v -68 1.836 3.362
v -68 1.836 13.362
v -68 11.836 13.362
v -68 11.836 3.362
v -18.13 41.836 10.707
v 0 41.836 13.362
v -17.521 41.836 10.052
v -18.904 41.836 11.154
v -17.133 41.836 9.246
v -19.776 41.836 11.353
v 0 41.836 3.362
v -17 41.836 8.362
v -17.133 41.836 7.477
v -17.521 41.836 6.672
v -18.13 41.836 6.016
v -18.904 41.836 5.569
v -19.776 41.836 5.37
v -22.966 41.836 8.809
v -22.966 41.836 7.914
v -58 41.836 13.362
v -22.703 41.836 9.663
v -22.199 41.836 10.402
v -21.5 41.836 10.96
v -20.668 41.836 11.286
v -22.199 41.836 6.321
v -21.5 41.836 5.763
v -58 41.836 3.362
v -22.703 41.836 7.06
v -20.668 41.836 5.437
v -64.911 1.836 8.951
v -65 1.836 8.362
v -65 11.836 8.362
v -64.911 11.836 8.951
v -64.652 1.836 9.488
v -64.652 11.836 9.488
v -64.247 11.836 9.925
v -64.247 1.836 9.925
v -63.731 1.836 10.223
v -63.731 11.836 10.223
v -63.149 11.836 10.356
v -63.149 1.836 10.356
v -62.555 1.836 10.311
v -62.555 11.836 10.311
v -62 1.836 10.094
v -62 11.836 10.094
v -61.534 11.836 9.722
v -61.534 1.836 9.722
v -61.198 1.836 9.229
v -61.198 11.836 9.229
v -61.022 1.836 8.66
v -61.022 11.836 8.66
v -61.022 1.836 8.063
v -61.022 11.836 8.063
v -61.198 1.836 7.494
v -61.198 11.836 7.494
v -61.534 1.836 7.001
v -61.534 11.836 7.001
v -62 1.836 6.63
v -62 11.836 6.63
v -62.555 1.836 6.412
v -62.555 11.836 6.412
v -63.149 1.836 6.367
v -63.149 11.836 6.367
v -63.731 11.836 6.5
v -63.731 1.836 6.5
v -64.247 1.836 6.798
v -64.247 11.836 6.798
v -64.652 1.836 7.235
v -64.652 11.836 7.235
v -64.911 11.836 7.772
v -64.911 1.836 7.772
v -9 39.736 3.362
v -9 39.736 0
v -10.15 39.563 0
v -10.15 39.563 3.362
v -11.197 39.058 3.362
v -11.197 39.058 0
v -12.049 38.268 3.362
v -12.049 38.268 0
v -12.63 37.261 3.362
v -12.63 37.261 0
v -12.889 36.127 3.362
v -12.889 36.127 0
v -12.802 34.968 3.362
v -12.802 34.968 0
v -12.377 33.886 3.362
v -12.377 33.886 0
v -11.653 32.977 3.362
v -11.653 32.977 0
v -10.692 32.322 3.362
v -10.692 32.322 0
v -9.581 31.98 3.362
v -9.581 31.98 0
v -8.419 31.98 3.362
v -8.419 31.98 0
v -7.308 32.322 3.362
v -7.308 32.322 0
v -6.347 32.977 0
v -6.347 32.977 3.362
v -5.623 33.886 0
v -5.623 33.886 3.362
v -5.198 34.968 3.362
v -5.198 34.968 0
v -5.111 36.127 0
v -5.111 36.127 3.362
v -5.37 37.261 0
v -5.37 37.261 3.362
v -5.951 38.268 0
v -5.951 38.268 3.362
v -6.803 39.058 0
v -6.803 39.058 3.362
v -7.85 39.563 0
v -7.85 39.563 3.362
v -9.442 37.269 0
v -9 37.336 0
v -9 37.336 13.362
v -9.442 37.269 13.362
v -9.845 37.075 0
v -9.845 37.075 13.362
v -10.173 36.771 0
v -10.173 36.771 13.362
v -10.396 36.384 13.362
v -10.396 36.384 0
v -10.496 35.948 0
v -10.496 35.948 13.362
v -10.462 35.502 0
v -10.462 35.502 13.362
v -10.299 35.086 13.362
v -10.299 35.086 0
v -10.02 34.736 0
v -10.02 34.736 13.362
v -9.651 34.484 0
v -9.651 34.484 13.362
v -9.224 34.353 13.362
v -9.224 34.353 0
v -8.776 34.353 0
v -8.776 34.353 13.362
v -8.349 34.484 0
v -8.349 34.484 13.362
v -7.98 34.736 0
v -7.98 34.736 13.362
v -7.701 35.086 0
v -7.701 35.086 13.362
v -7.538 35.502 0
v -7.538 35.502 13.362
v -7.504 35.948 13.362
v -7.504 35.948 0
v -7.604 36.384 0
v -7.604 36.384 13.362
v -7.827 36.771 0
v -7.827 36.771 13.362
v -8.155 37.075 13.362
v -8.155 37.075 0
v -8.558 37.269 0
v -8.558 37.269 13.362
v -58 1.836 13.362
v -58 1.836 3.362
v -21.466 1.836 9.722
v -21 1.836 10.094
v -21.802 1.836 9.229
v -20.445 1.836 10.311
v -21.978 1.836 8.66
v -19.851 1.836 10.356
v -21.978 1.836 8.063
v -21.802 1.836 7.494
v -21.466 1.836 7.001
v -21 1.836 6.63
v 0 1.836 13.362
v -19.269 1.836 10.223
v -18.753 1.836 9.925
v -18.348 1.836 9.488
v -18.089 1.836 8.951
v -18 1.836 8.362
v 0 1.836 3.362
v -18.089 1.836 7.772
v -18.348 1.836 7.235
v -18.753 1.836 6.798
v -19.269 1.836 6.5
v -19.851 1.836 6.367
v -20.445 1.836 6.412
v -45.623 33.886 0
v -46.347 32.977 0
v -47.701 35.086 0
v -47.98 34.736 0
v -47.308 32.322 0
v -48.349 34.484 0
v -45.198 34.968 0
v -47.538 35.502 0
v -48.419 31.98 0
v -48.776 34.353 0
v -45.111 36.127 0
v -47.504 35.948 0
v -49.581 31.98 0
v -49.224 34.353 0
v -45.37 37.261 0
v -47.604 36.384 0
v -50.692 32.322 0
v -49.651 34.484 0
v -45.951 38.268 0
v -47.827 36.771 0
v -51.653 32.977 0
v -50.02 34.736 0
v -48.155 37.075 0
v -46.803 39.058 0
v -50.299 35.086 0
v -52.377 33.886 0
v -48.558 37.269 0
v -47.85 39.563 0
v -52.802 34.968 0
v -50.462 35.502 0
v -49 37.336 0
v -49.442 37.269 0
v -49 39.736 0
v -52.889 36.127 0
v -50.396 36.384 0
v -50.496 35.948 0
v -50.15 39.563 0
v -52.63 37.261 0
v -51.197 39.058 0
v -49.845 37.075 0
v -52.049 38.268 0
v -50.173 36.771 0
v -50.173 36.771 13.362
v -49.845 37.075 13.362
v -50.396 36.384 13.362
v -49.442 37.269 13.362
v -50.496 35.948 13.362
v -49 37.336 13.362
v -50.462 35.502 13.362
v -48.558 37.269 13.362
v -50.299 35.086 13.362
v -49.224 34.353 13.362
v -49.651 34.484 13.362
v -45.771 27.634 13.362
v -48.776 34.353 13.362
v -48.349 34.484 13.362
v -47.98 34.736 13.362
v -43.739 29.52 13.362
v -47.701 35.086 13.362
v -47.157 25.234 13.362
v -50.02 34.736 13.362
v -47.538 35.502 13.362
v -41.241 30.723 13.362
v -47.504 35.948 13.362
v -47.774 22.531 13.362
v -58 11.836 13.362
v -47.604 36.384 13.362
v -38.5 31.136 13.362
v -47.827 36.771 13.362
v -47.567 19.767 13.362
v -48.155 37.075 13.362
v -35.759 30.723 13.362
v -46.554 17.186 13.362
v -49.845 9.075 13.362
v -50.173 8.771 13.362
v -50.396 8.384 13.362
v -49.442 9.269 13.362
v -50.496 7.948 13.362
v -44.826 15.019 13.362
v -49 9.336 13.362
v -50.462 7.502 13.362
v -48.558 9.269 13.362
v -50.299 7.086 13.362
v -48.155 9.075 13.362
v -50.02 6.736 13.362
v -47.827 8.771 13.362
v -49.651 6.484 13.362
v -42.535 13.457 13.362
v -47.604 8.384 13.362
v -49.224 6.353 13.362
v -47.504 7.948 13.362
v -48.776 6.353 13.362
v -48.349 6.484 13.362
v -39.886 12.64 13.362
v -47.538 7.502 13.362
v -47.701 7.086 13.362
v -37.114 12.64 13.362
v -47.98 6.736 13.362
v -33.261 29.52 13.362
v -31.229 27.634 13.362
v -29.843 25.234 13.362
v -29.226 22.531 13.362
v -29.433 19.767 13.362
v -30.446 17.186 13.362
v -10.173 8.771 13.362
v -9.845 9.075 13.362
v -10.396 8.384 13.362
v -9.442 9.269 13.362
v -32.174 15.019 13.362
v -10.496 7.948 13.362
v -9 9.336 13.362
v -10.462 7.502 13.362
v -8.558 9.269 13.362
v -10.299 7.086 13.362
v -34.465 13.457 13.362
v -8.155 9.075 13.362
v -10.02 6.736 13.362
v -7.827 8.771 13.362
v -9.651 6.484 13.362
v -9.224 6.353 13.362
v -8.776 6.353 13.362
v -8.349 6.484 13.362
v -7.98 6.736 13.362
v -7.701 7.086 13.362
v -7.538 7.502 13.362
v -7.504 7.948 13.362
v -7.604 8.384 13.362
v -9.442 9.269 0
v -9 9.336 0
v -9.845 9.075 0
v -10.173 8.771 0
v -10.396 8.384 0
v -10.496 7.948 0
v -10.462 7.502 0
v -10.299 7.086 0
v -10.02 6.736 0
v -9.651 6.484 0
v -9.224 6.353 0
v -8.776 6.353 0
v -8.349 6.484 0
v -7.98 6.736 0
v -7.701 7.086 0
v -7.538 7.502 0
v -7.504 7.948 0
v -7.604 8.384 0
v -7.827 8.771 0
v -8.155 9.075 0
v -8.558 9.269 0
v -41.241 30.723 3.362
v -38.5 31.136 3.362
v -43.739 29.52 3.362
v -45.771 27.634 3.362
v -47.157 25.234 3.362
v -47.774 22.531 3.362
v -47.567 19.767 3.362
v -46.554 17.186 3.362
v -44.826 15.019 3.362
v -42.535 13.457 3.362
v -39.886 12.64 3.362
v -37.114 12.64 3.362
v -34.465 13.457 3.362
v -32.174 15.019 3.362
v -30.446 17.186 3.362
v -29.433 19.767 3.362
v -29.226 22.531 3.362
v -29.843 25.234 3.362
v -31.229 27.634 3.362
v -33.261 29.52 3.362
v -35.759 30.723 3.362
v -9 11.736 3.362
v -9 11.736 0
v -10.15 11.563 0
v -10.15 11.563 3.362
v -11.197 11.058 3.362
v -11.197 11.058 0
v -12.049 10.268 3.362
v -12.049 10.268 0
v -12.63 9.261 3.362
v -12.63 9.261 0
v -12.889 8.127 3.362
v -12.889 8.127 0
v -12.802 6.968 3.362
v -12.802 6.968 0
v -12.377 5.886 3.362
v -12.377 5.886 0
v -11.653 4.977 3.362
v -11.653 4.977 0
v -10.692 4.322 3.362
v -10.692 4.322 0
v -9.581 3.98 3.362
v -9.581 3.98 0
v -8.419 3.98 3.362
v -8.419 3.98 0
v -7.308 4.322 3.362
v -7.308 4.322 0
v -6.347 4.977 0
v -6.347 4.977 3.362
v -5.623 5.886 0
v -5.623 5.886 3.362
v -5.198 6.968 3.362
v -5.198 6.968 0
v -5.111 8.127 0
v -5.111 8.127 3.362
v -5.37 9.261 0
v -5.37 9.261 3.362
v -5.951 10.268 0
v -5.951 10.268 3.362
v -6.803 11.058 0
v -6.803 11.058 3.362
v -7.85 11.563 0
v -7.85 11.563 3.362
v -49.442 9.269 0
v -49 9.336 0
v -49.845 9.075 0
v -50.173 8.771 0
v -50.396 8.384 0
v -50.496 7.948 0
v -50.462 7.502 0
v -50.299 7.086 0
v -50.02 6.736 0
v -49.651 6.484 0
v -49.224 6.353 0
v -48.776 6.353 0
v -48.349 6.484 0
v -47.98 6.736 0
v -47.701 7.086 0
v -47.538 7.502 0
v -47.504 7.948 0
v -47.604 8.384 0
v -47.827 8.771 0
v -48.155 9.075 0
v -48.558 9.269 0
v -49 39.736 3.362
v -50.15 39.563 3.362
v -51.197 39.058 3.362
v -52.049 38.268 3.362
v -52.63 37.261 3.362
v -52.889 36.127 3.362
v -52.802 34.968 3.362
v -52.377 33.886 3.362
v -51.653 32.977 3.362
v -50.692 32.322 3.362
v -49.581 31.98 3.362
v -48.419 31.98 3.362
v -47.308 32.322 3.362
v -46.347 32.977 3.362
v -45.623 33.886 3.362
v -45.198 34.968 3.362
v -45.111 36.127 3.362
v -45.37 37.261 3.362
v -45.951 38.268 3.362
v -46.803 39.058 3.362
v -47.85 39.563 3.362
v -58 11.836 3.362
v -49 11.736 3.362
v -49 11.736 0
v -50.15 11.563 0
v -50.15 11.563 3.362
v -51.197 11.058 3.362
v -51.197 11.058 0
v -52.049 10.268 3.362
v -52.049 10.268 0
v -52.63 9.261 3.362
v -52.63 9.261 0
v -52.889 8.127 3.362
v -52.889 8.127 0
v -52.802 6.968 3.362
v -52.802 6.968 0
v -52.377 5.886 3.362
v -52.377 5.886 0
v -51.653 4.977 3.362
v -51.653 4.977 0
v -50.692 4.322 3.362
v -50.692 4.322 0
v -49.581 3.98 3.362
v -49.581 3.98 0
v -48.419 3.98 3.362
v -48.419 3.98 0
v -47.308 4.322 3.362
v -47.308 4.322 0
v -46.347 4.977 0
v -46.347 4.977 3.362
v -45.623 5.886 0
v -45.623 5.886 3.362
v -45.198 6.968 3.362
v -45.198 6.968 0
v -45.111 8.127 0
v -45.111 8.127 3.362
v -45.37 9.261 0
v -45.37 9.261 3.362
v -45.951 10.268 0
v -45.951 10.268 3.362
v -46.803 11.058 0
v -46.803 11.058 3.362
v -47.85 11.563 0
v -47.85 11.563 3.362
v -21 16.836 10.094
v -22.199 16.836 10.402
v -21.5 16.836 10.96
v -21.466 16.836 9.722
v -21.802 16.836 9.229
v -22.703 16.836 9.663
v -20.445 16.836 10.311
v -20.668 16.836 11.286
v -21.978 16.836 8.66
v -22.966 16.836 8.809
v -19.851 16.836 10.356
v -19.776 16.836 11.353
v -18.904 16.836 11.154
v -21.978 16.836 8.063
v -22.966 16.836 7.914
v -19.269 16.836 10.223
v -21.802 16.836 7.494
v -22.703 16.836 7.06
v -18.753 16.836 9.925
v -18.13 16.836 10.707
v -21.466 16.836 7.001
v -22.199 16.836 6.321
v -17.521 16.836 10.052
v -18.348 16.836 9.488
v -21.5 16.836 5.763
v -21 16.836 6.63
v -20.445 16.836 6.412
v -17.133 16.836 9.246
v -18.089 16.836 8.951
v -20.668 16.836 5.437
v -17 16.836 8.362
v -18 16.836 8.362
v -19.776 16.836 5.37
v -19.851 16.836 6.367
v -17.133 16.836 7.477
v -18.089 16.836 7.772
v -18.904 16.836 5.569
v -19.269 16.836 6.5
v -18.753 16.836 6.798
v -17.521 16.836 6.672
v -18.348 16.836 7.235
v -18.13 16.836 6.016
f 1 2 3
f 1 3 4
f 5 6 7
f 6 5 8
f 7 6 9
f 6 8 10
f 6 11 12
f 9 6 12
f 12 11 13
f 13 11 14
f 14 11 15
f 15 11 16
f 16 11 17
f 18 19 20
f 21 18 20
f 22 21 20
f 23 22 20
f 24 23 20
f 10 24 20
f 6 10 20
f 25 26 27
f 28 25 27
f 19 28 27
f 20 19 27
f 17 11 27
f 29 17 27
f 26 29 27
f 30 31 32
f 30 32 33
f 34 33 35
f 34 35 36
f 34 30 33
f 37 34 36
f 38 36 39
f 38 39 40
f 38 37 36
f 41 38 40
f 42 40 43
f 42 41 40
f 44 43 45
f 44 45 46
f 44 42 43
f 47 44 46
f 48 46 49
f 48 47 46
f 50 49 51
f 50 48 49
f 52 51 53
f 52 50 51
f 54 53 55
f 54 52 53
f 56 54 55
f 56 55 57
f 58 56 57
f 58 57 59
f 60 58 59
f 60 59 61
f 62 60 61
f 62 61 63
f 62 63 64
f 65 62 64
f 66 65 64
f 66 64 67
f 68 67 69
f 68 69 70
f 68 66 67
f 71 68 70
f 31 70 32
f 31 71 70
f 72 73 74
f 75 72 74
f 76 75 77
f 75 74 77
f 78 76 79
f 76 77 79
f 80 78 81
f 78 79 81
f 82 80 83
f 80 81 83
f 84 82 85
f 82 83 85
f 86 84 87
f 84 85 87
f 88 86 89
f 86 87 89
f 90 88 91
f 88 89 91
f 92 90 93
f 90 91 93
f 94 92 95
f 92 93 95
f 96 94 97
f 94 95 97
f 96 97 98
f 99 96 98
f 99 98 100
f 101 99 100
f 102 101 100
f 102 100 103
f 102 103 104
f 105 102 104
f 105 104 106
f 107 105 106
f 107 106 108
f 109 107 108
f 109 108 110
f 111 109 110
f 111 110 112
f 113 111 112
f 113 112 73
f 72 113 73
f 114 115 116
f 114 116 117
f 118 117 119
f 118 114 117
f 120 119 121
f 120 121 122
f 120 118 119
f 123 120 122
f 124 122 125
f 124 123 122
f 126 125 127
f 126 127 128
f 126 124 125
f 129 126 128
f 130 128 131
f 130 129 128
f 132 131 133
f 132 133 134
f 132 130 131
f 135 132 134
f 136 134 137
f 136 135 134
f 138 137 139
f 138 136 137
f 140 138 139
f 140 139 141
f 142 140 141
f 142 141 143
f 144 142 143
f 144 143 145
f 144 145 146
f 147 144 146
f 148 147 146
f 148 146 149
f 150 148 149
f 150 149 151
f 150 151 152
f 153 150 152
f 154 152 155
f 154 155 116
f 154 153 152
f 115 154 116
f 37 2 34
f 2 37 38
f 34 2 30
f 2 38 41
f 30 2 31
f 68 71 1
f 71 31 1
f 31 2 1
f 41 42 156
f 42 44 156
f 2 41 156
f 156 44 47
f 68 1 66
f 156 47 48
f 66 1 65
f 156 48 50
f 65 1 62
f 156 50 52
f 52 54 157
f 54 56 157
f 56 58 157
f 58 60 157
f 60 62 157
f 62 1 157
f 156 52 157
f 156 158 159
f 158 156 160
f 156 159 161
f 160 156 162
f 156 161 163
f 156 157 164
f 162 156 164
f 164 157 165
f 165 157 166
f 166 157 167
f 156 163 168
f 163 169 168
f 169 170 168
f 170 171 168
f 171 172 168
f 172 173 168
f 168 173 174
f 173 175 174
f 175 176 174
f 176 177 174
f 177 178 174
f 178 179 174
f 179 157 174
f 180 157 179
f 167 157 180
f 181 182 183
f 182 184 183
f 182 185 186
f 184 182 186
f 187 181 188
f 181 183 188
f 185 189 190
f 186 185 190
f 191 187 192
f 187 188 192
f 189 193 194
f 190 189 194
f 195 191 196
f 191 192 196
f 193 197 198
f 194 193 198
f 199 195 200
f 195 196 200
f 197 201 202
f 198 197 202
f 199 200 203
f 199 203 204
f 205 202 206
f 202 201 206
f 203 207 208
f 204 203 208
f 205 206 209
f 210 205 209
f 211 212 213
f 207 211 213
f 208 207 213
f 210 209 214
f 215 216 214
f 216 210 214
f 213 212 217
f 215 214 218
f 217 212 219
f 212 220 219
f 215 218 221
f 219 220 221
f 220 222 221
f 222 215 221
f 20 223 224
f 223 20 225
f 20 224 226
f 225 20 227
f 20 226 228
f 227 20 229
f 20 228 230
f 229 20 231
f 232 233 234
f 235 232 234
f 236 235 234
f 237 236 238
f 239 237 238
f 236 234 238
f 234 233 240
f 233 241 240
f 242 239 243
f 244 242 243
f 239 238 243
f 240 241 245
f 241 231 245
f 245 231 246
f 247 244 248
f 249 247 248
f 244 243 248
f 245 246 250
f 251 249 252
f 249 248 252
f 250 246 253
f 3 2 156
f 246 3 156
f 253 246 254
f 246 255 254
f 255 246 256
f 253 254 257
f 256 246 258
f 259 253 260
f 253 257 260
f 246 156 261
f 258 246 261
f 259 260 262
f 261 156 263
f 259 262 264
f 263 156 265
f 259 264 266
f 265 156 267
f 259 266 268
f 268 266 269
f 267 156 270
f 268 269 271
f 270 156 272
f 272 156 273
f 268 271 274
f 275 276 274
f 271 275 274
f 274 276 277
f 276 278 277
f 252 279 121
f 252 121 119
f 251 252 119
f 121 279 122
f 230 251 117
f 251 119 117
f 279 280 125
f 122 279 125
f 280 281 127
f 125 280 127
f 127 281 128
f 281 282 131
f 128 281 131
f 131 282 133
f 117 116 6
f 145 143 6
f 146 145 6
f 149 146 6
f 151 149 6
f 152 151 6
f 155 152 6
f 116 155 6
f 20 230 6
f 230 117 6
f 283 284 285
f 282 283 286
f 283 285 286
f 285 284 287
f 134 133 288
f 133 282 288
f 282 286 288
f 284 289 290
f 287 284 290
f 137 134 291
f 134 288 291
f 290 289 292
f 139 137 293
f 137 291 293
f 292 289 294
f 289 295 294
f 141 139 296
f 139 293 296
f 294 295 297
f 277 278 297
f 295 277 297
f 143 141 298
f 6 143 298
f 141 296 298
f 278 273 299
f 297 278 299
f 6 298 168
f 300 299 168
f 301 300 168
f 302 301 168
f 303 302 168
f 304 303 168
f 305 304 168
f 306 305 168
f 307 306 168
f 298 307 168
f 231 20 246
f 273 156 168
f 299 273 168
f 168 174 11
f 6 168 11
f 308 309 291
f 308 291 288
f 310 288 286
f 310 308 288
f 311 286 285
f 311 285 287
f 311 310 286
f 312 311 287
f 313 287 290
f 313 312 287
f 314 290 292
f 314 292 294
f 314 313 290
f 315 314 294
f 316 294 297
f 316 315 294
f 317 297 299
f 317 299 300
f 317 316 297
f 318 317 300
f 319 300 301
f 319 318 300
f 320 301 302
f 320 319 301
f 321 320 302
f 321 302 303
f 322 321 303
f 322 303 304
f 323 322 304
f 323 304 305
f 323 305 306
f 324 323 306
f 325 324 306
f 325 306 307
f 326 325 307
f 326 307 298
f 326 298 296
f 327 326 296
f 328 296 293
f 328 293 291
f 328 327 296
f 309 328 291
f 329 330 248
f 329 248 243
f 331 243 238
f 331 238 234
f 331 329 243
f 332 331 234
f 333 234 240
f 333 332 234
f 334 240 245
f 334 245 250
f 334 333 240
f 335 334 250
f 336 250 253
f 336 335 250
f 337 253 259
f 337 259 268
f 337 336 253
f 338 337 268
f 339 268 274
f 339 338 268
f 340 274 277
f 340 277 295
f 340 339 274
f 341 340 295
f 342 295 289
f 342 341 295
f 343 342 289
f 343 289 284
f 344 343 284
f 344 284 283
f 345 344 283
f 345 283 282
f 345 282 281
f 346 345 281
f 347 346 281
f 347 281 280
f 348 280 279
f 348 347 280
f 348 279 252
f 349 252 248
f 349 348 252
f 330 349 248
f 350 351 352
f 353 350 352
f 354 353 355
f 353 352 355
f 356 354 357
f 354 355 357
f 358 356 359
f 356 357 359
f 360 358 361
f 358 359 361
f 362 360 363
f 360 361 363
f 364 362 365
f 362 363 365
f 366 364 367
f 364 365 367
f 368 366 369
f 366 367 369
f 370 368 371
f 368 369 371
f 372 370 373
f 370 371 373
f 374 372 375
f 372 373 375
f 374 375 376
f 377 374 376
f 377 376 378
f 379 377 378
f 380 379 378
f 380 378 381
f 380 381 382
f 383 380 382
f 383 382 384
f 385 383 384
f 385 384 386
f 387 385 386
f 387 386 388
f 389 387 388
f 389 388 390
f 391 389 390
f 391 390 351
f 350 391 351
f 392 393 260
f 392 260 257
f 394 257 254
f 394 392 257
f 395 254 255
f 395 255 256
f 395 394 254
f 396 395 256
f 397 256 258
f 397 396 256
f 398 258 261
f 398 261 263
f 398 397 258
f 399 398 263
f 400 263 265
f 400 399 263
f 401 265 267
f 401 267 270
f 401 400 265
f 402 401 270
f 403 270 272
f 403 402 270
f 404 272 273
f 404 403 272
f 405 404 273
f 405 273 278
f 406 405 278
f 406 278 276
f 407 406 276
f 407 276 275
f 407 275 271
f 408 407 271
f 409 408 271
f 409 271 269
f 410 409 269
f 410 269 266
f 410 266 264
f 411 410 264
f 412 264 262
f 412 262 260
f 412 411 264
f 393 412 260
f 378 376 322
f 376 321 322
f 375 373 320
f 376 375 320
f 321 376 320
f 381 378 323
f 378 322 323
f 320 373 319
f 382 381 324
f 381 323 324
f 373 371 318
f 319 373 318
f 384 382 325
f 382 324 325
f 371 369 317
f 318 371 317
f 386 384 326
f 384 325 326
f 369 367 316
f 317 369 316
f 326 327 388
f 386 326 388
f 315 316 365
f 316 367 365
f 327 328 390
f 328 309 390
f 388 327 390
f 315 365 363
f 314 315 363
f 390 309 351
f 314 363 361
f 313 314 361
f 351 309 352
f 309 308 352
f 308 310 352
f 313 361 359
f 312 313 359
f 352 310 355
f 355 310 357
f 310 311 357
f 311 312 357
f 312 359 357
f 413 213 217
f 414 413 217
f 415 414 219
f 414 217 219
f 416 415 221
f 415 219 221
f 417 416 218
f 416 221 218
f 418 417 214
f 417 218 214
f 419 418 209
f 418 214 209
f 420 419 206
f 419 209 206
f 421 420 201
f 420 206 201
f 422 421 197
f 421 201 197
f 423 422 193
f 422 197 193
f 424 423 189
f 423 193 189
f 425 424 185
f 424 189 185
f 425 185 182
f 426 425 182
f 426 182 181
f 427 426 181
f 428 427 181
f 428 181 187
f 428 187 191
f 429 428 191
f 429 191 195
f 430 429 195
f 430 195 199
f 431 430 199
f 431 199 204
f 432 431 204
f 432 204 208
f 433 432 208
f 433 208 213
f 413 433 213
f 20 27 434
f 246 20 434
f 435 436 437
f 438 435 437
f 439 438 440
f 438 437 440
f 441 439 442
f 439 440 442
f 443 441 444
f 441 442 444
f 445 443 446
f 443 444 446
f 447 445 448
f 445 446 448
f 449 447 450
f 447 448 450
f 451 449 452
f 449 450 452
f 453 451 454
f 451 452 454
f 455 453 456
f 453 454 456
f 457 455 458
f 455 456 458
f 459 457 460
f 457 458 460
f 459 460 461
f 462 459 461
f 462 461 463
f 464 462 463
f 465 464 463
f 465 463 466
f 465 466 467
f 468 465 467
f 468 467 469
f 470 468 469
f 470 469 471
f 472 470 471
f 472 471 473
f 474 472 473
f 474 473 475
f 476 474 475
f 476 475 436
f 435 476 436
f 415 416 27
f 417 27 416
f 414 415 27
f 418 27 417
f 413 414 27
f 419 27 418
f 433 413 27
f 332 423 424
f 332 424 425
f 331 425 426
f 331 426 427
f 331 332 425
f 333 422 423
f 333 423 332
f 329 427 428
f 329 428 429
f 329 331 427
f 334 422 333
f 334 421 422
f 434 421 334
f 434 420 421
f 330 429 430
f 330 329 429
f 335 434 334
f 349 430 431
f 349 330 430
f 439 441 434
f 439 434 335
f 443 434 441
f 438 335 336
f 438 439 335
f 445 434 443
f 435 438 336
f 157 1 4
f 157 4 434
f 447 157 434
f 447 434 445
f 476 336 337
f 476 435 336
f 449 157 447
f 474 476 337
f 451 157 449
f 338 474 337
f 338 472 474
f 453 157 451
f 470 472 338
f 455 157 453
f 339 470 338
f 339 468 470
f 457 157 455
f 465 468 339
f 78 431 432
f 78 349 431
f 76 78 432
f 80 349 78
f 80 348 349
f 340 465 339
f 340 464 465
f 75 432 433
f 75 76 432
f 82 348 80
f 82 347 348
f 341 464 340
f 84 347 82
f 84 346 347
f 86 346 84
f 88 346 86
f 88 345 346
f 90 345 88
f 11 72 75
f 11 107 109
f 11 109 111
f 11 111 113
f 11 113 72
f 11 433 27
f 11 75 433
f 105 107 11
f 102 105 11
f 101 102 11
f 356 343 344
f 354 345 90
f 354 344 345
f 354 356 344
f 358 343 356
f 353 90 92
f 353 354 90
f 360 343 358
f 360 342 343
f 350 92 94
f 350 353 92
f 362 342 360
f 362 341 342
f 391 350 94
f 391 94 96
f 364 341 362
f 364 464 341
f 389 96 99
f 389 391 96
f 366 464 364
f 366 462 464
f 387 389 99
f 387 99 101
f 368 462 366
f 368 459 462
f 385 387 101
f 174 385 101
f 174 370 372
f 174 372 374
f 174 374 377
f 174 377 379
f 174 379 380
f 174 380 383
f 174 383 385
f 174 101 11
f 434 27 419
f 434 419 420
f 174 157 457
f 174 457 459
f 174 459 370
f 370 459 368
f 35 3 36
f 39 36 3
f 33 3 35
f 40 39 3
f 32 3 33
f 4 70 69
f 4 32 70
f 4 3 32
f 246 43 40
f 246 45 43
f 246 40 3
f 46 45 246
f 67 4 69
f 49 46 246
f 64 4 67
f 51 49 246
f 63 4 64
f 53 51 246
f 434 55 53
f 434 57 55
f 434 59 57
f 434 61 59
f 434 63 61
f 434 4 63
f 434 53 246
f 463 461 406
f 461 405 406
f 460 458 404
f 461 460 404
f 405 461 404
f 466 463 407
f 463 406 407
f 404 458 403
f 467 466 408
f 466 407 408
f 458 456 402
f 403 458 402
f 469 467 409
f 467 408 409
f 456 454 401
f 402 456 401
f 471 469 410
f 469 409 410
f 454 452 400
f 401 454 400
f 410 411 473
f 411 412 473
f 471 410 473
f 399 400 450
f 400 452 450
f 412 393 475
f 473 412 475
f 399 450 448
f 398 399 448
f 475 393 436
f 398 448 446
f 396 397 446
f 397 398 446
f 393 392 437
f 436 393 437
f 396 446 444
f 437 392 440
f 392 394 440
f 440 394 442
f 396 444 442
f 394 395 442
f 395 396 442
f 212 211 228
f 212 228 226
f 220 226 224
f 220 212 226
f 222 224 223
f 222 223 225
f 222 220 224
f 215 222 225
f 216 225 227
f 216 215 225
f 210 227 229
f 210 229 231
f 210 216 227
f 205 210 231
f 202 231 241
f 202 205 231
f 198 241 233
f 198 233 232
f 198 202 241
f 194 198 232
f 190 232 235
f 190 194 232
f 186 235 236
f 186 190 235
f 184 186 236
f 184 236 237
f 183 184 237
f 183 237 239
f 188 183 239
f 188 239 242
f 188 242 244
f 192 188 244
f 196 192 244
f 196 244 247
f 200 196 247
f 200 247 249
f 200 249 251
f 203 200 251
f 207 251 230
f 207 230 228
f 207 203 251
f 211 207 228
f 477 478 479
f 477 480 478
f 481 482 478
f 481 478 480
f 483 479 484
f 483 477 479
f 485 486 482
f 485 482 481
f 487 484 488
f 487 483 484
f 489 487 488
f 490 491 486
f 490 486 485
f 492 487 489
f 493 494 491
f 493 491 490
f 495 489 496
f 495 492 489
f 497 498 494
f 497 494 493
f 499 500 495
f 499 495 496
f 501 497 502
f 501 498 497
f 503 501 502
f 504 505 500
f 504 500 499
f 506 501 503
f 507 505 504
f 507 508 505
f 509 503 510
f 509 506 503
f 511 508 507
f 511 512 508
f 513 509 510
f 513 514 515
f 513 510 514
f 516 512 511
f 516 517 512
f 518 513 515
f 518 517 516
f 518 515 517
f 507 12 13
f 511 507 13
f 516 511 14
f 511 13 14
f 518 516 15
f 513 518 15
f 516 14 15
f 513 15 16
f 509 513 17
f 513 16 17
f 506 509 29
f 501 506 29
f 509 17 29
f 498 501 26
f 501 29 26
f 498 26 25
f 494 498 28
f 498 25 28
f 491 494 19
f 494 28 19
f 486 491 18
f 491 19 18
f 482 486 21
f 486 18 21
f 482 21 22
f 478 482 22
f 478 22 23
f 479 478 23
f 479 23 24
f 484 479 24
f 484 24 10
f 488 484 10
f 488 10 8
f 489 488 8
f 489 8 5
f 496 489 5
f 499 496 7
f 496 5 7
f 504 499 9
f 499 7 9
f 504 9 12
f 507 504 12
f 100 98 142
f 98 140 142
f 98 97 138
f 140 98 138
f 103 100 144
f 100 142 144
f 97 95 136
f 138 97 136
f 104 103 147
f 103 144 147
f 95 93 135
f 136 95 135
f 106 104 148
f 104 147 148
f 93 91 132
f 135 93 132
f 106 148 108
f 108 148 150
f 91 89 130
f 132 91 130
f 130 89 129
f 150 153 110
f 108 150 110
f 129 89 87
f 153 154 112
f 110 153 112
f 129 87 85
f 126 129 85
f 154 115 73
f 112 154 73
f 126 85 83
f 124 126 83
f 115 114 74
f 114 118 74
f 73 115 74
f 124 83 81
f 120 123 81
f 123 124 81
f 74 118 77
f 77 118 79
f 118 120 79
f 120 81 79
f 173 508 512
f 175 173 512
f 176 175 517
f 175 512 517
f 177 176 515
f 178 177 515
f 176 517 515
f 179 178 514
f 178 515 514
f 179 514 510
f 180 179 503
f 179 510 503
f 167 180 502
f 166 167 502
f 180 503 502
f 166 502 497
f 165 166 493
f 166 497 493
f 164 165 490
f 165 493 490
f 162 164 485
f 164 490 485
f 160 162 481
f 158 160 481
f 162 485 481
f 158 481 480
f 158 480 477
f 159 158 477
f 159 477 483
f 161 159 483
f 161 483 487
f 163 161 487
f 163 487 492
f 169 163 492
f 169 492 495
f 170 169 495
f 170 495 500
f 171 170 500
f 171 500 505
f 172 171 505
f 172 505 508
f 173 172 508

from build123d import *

# Parameters (mm, degrees)
SKETCH1_R             = 3.9
SKETCH1_R_2           = 1.5
BOSS_EXTRUDE1_DEPTH   = 13.361552014
BOSS_EXTRUDE1_2_DEPTH = 13.361552014
BOSS_EXTRUDE1_3_DEPTH = 13.361552014
BOSS_EXTRUDE1_4_DEPTH = 13.361552014
BOSS_EXTRUDE2_START   = 5.161552
SKETCH2_R             = 3.9
SKETCH2_R_2           = 9.3
BOSS_EXTRUDE2_DEPTH   = 10
CUT_EXTRUDE1_DEPTH    = 25
CUT_EXTRUDE2_DEPTH    = 72.711443105
SKETCH5_W             = 10
SKETCH5_H             = 10
SKETCH5_R             = 2
BOSS_EXTRUDE3_DEPTH   = 10


with BuildPart() as part:
    # Sketch1 → Boss-Extrude1 (new body)
    with BuildSketch(Plane.XY):
        with Locations(Location((-49, 7.83595021, 0), (0, 0, 90))):
            Circle(SKETCH1_R)
        with Locations(Location((-49, 7.83595021, 0), (0, 0, 90))):
            Circle(SKETCH1_R_2, mode=Mode.SUBTRACT)
    extrude(amount=BOSS_EXTRUDE1_DEPTH)



with BuildPart() as body_2:
    # Sketch1 → Boss-Extrude1 2 (new body)
    with BuildSketch(Plane.XY):
        with Locations(Location((-49, 35.83595021, 0), (0, 0, 90))):
            Circle(SKETCH1_R)
        with Locations(Location((-49, 35.83595021, 0), (0, 0, 90))):
            Circle(SKETCH1_R_2, mode=Mode.SUBTRACT)
    extrude(amount=BOSS_EXTRUDE1_2_DEPTH)


with BuildPart() as body_3:
    # Sketch1 → Boss-Extrude1 3 (new body)
    with BuildSketch(Plane.XY):
        with Locations(Location((-9, 35.83595021, 0), (0, 0, 90))):
            Circle(SKETCH1_R)
        with Locations(Location((-9, 35.83595021, 0), (0, 0, 90))):
            Circle(SKETCH1_R_2, mode=Mode.SUBTRACT)
    extrude(amount=BOSS_EXTRUDE1_3_DEPTH)


with BuildPart() as body_4:
    # Sketch1 → Boss-Extrude1 4 (new body)
    with BuildSketch(Plane.XY):
        with Locations(Location((-9, 7.83595021, 0), (0, 0, 90))):
            Circle(SKETCH1_R)
        with Locations(Location((-9, 7.83595021, 0), (0, 0, 90))):
            Circle(SKETCH1_R_2, mode=Mode.SUBTRACT)
    extrude(amount=BOSS_EXTRUDE1_4_DEPTH)


with BuildPart() as part_1:
    add(part.part)

    add(body_2.part)  # Boss-Extrude2 merges body 2

    add(body_3.part)  # Boss-Extrude2 merges body 3

    add(body_4.part)  # Boss-Extrude2 merges body 4
    # Sketch2 → Boss-Extrude2 (add)
    with BuildSketch(Plane.XY.offset(-1.8).offset(BOSS_EXTRUDE2_START)):
        Polygon((-58, 1.83595021), (0, 1.83595021), (0, 5.290014366), (0, 38.441339865), (0, 41.83595021), (-58, 41.83595021), align=None)
        with Locations(Location((-9, 35.83595021, 0), (0, 0, 90))):
            Circle(SKETCH2_R, mode=Mode.SUBTRACT)
        with Locations(Location((-49, 7.83595021, 0), (0, 0, 270))):
            Circle(SKETCH2_R, mode=Mode.SUBTRACT)
        with Locations(Location((-38.5, 21.83595021, 0), (0, 0, 90))):
            Circle(SKETCH2_R_2, mode=Mode.SUBTRACT)
        with Locations(Location((-49, 35.83595021, 0), (0, 0, 90))):
            Circle(SKETCH2_R, mode=Mode.SUBTRACT)
        with Locations(Location((-9, 7.83595021, 0), (0, 0, 90))):
            Circle(SKETCH2_R, mode=Mode.SUBTRACT)
    extrude(amount=BOSS_EXTRUDE2_DEPTH)

    # Sketch4 → Cut-Extrude1 (cut)
    with BuildSketch(Plane(origin=(0, 41.83595021, 0), x_dir=(1, 0, 0), z_dir=(0, 1, 0))):
        with BuildLine():
            ThreePointArc((-23, -8.361552014), (-20, -11.361552014), (-17, -8.361552014))
            Line((-17, -8.361552014), (-18, -8.361552014))
            ThreePointArc((-18, -8.361552014), (-20, -10.361552014), (-22, -8.361552014))
            Line((-22, -8.361552014), (-23, -8.361552014))
        make_face()
        with BuildLine():
            Line((-18, -8.361552014), (-17, -8.361552014))
            ThreePointArc((-17, -8.361552014), (-20, -5.361552014), (-23, -8.361552014))
            Line((-23, -8.361552014), (-22, -8.361552014))
            ThreePointArc((-22, -8.361552014), (-20, -6.361552014), (-18, -8.361552014))
        make_face()
        with BuildLine():
            ThreePointArc((-22, -8.361552014), (-20, -10.361552014), (-18, -8.361552014))
            Line((-18, -8.361552014), (-22, -8.361552014))
        make_face()
        with BuildLine():
            Line((-22, -8.361552014), (-18, -8.361552014))
            ThreePointArc((-18, -8.361552014), (-20, -6.361552014), (-22, -8.361552014))
        make_face()
    extrude(amount=-CUT_EXTRUDE1_DEPTH, mode=Mode.SUBTRACT)

    # Sketch4<3> → Cut-Extrude2 (cut, through all)
    with BuildSketch(Plane(origin=(0, 41.83595021, 0), x_dir=(1, 0, 0), z_dir=(0, 1, 0))):
        with BuildLine():
            ThreePointArc((-22, -8.361552014), (-20, -10.361552014), (-18, -8.361552014))
            Line((-18, -8.361552014), (-22, -8.361552014))
        make_face()
        with BuildLine():
            Line((-22, -8.361552014), (-18, -8.361552014))
            ThreePointArc((-18, -8.361552014), (-20, -6.361552014), (-22, -8.361552014))
        make_face()
    extrude(amount=-CUT_EXTRUDE2_DEPTH, mode=Mode.SUBTRACT)

    # Sketch5 → Boss-Extrude3 (add)
    with BuildSketch(Plane(origin=(0, 1.83595021, 0), x_dir=(1, 0, 0), z_dir=(0, 1, 0))):
        with Locations((-63, -8.361552014)):
            Rectangle(SKETCH5_W, SKETCH5_H)
        with Locations(Location((-63, -8.361552014, 0), (0, 0, 180))):
            Circle(SKETCH5_R, mode=Mode.SUBTRACT)
    extrude(amount=BOSS_EXTRUDE3_DEPTH)


solid = part_1.part
